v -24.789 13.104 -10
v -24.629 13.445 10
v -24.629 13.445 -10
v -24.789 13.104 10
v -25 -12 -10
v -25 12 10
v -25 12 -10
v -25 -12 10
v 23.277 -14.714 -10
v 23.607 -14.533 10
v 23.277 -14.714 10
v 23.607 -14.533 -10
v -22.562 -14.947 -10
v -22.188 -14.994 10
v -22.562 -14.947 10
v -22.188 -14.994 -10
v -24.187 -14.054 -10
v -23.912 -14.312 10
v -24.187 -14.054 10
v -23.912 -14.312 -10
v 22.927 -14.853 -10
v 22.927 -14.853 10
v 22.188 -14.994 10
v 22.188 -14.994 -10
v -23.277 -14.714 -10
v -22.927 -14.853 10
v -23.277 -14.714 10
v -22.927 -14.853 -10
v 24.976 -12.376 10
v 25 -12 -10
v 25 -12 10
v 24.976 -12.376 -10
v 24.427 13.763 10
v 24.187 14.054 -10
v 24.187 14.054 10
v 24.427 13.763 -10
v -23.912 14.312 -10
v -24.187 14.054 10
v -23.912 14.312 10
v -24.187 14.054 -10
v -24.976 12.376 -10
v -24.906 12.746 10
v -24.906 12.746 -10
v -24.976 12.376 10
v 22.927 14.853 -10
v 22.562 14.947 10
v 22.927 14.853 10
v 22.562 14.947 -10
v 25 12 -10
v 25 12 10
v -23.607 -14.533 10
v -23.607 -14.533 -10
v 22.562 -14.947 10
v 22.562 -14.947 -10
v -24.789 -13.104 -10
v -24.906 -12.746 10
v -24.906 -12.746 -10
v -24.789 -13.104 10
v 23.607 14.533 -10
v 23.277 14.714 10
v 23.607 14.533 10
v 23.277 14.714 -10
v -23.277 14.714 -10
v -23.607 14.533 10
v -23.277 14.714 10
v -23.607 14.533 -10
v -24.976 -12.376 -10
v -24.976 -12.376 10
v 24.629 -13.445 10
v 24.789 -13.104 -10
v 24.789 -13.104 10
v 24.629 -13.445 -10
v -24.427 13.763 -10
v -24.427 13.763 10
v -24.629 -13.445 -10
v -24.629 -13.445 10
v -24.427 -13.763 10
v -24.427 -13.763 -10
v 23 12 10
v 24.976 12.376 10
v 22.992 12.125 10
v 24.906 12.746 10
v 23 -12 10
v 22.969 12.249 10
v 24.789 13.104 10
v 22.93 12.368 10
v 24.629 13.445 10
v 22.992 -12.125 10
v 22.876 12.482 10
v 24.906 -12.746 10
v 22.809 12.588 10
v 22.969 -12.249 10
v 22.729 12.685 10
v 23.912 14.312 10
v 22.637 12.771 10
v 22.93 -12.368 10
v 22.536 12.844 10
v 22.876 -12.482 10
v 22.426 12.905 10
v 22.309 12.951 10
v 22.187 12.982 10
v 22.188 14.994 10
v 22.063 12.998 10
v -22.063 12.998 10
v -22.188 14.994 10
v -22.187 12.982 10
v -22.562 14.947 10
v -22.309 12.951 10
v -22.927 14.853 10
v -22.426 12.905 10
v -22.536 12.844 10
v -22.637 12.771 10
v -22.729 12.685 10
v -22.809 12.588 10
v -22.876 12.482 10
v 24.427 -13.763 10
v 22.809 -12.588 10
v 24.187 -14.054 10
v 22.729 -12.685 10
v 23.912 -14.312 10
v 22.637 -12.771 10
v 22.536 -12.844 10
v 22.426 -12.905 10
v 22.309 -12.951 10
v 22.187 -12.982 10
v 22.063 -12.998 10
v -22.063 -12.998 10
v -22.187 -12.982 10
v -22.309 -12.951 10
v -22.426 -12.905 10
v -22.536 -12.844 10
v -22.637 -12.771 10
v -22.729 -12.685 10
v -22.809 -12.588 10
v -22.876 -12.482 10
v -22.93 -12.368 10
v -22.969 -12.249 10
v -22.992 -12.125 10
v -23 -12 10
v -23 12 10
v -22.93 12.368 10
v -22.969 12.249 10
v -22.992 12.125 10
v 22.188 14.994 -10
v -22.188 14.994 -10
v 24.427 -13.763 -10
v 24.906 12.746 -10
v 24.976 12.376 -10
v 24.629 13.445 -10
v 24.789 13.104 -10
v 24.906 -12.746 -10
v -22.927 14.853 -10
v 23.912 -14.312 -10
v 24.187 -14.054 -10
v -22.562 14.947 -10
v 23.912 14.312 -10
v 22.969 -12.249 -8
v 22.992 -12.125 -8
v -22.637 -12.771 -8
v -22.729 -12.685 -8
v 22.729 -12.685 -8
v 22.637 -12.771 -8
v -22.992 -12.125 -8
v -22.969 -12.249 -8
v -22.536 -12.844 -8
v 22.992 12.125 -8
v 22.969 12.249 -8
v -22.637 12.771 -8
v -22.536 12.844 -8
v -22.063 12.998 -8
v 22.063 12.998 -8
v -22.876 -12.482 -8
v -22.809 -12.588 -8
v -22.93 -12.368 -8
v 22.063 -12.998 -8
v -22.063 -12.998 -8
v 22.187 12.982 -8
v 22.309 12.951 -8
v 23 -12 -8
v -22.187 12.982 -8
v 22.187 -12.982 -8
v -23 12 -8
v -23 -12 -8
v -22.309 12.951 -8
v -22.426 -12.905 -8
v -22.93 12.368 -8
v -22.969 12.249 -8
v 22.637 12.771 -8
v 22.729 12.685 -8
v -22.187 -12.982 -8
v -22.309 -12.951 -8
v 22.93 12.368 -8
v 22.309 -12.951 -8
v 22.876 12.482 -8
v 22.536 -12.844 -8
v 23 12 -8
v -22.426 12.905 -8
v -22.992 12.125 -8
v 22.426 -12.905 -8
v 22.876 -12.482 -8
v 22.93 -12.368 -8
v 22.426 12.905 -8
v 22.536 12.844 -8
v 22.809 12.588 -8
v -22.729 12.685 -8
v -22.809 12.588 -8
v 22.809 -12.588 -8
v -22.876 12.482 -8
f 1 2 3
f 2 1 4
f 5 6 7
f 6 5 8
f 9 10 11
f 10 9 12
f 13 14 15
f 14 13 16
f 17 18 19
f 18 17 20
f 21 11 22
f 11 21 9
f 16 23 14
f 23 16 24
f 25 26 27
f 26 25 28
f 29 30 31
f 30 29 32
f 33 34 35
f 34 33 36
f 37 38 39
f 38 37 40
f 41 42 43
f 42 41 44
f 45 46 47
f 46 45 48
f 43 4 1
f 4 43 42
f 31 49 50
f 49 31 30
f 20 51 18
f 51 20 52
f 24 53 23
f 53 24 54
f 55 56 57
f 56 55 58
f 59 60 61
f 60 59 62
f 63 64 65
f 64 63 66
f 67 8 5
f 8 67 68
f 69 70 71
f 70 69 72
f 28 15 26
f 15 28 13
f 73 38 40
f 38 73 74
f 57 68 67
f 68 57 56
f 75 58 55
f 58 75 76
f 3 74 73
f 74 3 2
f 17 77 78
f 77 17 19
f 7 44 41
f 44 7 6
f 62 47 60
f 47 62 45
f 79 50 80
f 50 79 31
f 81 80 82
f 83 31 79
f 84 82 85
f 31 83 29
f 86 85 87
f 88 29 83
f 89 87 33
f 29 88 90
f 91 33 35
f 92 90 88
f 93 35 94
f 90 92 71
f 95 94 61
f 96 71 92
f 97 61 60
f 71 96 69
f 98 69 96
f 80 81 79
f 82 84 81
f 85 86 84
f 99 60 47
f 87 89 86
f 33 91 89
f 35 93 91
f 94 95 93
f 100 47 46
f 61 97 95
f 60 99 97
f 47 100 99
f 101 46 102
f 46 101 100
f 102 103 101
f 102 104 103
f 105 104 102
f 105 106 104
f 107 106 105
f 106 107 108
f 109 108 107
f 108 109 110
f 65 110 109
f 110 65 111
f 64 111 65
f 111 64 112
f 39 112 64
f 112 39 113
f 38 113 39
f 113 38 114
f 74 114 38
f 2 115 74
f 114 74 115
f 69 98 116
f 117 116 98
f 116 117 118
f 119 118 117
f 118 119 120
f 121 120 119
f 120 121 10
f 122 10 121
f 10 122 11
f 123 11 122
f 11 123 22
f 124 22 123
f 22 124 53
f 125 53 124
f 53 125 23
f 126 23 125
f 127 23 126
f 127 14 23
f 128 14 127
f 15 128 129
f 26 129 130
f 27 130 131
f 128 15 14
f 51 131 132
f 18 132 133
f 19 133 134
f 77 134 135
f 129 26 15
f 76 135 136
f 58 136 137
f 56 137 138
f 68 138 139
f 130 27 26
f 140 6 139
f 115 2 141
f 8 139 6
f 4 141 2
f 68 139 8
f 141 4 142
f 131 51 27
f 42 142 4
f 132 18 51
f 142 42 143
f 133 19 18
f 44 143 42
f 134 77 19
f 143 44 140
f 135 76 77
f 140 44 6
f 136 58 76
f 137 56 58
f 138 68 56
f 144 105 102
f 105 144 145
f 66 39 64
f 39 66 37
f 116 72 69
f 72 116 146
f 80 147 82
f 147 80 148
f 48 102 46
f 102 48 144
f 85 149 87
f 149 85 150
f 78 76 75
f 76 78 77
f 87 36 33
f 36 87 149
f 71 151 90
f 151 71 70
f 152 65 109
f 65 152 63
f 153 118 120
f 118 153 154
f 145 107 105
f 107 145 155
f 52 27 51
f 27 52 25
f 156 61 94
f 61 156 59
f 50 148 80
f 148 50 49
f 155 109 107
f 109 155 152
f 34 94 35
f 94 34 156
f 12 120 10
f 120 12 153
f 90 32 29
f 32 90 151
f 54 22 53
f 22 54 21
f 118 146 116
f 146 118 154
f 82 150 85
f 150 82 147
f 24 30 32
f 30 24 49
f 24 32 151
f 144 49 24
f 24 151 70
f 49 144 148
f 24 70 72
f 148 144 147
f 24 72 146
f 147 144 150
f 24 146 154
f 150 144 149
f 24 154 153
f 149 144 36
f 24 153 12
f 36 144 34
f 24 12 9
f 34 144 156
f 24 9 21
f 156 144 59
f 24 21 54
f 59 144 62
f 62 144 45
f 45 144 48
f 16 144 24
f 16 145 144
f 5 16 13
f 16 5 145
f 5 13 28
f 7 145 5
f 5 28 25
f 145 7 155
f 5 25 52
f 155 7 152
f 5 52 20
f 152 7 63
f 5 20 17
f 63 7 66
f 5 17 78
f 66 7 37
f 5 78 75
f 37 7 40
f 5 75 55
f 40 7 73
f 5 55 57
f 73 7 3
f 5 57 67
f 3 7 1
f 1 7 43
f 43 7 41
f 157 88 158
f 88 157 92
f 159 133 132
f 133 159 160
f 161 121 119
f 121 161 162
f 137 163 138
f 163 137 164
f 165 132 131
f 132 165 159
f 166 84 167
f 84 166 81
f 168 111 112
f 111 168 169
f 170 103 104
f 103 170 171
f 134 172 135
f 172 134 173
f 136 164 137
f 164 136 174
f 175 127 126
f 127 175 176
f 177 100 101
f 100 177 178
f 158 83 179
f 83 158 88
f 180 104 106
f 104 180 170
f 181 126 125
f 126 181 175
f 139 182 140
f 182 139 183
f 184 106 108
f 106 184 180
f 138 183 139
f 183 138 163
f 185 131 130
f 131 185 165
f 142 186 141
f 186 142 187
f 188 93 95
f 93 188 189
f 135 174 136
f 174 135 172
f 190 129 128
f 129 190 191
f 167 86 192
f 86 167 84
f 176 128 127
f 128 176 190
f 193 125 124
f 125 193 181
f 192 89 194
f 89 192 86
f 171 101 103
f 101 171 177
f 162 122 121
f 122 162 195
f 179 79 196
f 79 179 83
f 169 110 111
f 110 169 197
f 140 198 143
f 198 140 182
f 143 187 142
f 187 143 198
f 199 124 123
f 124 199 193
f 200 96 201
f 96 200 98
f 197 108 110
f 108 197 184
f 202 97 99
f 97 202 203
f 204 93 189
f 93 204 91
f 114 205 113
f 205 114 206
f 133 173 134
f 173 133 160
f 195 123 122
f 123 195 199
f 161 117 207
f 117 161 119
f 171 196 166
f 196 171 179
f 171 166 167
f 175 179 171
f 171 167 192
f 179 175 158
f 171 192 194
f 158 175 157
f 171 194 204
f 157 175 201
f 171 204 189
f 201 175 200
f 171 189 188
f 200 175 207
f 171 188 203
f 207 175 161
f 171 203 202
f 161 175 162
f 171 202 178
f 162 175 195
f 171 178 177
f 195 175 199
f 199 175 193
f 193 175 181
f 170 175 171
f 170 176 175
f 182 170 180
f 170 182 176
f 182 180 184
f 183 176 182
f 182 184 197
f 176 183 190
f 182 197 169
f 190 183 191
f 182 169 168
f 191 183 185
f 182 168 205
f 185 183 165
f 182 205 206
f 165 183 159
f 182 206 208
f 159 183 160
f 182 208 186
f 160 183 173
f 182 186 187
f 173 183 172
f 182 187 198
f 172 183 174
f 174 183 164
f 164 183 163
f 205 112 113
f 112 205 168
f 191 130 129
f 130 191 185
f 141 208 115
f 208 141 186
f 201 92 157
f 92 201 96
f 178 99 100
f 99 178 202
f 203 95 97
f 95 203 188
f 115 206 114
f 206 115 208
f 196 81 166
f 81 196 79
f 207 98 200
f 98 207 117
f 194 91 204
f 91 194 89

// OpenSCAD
// file: ../utils/common_modules.scad
// Common OpenSCAD Modules and Functions
// Reusable components for your projects

// Create a rounded rectangle
module rounded_rectangle(width, height, depth, radius) {
    hull() {
        for (x = [-width/2 + radius, width/2 - radius]) {
            for (y = [-height/2 + radius, height/2 - radius]) {
                translate([x, y, 0]) {
                    cylinder(h=depth, r=radius, center=true);
                }
            }
        }
    }
}

// Create a hexagon
module hexagon(radius, height) {
    cylinder(h=height, r=radius, $fn=6, center=true);
}

// Create a star shape
module star(outer_radius, inner_radius, points, height) {
    linear_extrude(height=height, center=true) {
        polygon(points=concat(
            [for (i = [0:points-1]) [
                outer_radius * cos(i * 360/points),
                outer_radius * sin(i * 360/points)
            ]],
            [for (i = [0:points-1]) [
                inner_radius * cos((i + 0.5) * 360/points),
                inner_radius * sin((i + 0.5) * 360/points)
            ]]
        ));
    }
}

// Create a gear (simplified)
module gear(teeth, pitch_radius, height, tooth_height) {
    difference() {
        cylinder(h=height, r=pitch_radius + tooth_height, center=true);
        for (i = [0:teeth-1]) {
            rotate([0, 0, i * 360/teeth]) {
                translate([pitch_radius, 0, 0]) {
                    cube([tooth_height*2, 2, height+1], center=true);
                }
            }
        }
    }
}

// Create a spiral
module spiral(radius, height, turns, resolution=100) {
    points = [for (i = [0:resolution-1]) [
        (radius * i / resolution) * cos(i * turns * 360 / resolution),
        (radius * i / resolution) * sin(i * turns * 360 / resolution),
        height * i / resolution
    ]];
    
    for (i = [0:len(points)-2]) {
        hull() {
            translate(points[i]) sphere(r=1);
            translate(points[i+1]) sphere(r=1);
        }
    }
}
// main file
/*
 * OpenSCAD Project Template
 * Copy this file to start a new project
 */

// =============================================================================
// PROJECT CONFIGURATION
// =============================================================================

// Project metadata
PROJECT_NAME = "My Project";
PROJECT_VERSION = "1.0.0";
PROJECT_AUTHOR = "Your Name";
PROJECT_DESCRIPTION = "Description of your project";

// =============================================================================
// LIBRARY IMPORTS
// =============================================================================

// Core libraries (uncomment as needed)
// use <../libraries/bosl2/BOSL2.scad>;           // Most comprehensive library
// use <../libraries/dotscad/dotSCAD.scad>;       // Mathematical utilities
// use <../libraries/round-anything/round_anything.scad>; // Rounding utilities
// use <../libraries/nopscadlib/NopSCADlib.scad>; // 3D printing parts
// use <../libraries/bolts/bolts.scad>;           // Hardware specifications

// Local utilities
use <../utils/common_modules.scad>;

// =============================================================================
// PARAMETERS
// =============================================================================

// Main dimensions
width = 50;
height = 30;
depth = 20;

// Design parameters
wall_thickness = 2;
corner_radius = 3;
hole_diameter = 5;

// Quality settings
$fn = 50;  // Fragment number for smooth curves

// =============================================================================
// MODULES
// =============================================================================

module main_object() {
    difference() {
        // Outer shape
        rounded_rectangle(width, height, depth, corner_radius);
        
        // Inner cavity
        translate([0, 0, wall_thickness]) {
            rounded_rectangle(
                width - 2*wall_thickness,
                height - 2*wall_thickness,
                depth,
                corner_radius - wall_thickness
            );
        }
        
        // Holes or cutouts
        translate([0, 0, -1]) {
            cylinder(h=depth+2, d=hole_diameter);
        }
    }
}

module decorative_element() {
    // Add decorative elements here
    translate([0, 0, depth/2 + 2]) {
        star(8, 4, 5, 2);
    }
}

// =============================================================================
// MAIN ASSEMBLY
// =============================================================================

// Uncomment the parts you want to include
main_object();
// decorative_element();

// =============================================================================
// ANIMATION (for preview)
// =============================================================================

// Uncomment for animated preview
// $t = time;  // Animation parameter
// rotate([0, 0, $t * 360]) {
//     main_object();
// }

// =============================================================================
// DEBUGGING
// =============================================================================

// Uncomment for debugging
// %main_object();  // Ghost view
// #decorative_element();  // Highlight view
